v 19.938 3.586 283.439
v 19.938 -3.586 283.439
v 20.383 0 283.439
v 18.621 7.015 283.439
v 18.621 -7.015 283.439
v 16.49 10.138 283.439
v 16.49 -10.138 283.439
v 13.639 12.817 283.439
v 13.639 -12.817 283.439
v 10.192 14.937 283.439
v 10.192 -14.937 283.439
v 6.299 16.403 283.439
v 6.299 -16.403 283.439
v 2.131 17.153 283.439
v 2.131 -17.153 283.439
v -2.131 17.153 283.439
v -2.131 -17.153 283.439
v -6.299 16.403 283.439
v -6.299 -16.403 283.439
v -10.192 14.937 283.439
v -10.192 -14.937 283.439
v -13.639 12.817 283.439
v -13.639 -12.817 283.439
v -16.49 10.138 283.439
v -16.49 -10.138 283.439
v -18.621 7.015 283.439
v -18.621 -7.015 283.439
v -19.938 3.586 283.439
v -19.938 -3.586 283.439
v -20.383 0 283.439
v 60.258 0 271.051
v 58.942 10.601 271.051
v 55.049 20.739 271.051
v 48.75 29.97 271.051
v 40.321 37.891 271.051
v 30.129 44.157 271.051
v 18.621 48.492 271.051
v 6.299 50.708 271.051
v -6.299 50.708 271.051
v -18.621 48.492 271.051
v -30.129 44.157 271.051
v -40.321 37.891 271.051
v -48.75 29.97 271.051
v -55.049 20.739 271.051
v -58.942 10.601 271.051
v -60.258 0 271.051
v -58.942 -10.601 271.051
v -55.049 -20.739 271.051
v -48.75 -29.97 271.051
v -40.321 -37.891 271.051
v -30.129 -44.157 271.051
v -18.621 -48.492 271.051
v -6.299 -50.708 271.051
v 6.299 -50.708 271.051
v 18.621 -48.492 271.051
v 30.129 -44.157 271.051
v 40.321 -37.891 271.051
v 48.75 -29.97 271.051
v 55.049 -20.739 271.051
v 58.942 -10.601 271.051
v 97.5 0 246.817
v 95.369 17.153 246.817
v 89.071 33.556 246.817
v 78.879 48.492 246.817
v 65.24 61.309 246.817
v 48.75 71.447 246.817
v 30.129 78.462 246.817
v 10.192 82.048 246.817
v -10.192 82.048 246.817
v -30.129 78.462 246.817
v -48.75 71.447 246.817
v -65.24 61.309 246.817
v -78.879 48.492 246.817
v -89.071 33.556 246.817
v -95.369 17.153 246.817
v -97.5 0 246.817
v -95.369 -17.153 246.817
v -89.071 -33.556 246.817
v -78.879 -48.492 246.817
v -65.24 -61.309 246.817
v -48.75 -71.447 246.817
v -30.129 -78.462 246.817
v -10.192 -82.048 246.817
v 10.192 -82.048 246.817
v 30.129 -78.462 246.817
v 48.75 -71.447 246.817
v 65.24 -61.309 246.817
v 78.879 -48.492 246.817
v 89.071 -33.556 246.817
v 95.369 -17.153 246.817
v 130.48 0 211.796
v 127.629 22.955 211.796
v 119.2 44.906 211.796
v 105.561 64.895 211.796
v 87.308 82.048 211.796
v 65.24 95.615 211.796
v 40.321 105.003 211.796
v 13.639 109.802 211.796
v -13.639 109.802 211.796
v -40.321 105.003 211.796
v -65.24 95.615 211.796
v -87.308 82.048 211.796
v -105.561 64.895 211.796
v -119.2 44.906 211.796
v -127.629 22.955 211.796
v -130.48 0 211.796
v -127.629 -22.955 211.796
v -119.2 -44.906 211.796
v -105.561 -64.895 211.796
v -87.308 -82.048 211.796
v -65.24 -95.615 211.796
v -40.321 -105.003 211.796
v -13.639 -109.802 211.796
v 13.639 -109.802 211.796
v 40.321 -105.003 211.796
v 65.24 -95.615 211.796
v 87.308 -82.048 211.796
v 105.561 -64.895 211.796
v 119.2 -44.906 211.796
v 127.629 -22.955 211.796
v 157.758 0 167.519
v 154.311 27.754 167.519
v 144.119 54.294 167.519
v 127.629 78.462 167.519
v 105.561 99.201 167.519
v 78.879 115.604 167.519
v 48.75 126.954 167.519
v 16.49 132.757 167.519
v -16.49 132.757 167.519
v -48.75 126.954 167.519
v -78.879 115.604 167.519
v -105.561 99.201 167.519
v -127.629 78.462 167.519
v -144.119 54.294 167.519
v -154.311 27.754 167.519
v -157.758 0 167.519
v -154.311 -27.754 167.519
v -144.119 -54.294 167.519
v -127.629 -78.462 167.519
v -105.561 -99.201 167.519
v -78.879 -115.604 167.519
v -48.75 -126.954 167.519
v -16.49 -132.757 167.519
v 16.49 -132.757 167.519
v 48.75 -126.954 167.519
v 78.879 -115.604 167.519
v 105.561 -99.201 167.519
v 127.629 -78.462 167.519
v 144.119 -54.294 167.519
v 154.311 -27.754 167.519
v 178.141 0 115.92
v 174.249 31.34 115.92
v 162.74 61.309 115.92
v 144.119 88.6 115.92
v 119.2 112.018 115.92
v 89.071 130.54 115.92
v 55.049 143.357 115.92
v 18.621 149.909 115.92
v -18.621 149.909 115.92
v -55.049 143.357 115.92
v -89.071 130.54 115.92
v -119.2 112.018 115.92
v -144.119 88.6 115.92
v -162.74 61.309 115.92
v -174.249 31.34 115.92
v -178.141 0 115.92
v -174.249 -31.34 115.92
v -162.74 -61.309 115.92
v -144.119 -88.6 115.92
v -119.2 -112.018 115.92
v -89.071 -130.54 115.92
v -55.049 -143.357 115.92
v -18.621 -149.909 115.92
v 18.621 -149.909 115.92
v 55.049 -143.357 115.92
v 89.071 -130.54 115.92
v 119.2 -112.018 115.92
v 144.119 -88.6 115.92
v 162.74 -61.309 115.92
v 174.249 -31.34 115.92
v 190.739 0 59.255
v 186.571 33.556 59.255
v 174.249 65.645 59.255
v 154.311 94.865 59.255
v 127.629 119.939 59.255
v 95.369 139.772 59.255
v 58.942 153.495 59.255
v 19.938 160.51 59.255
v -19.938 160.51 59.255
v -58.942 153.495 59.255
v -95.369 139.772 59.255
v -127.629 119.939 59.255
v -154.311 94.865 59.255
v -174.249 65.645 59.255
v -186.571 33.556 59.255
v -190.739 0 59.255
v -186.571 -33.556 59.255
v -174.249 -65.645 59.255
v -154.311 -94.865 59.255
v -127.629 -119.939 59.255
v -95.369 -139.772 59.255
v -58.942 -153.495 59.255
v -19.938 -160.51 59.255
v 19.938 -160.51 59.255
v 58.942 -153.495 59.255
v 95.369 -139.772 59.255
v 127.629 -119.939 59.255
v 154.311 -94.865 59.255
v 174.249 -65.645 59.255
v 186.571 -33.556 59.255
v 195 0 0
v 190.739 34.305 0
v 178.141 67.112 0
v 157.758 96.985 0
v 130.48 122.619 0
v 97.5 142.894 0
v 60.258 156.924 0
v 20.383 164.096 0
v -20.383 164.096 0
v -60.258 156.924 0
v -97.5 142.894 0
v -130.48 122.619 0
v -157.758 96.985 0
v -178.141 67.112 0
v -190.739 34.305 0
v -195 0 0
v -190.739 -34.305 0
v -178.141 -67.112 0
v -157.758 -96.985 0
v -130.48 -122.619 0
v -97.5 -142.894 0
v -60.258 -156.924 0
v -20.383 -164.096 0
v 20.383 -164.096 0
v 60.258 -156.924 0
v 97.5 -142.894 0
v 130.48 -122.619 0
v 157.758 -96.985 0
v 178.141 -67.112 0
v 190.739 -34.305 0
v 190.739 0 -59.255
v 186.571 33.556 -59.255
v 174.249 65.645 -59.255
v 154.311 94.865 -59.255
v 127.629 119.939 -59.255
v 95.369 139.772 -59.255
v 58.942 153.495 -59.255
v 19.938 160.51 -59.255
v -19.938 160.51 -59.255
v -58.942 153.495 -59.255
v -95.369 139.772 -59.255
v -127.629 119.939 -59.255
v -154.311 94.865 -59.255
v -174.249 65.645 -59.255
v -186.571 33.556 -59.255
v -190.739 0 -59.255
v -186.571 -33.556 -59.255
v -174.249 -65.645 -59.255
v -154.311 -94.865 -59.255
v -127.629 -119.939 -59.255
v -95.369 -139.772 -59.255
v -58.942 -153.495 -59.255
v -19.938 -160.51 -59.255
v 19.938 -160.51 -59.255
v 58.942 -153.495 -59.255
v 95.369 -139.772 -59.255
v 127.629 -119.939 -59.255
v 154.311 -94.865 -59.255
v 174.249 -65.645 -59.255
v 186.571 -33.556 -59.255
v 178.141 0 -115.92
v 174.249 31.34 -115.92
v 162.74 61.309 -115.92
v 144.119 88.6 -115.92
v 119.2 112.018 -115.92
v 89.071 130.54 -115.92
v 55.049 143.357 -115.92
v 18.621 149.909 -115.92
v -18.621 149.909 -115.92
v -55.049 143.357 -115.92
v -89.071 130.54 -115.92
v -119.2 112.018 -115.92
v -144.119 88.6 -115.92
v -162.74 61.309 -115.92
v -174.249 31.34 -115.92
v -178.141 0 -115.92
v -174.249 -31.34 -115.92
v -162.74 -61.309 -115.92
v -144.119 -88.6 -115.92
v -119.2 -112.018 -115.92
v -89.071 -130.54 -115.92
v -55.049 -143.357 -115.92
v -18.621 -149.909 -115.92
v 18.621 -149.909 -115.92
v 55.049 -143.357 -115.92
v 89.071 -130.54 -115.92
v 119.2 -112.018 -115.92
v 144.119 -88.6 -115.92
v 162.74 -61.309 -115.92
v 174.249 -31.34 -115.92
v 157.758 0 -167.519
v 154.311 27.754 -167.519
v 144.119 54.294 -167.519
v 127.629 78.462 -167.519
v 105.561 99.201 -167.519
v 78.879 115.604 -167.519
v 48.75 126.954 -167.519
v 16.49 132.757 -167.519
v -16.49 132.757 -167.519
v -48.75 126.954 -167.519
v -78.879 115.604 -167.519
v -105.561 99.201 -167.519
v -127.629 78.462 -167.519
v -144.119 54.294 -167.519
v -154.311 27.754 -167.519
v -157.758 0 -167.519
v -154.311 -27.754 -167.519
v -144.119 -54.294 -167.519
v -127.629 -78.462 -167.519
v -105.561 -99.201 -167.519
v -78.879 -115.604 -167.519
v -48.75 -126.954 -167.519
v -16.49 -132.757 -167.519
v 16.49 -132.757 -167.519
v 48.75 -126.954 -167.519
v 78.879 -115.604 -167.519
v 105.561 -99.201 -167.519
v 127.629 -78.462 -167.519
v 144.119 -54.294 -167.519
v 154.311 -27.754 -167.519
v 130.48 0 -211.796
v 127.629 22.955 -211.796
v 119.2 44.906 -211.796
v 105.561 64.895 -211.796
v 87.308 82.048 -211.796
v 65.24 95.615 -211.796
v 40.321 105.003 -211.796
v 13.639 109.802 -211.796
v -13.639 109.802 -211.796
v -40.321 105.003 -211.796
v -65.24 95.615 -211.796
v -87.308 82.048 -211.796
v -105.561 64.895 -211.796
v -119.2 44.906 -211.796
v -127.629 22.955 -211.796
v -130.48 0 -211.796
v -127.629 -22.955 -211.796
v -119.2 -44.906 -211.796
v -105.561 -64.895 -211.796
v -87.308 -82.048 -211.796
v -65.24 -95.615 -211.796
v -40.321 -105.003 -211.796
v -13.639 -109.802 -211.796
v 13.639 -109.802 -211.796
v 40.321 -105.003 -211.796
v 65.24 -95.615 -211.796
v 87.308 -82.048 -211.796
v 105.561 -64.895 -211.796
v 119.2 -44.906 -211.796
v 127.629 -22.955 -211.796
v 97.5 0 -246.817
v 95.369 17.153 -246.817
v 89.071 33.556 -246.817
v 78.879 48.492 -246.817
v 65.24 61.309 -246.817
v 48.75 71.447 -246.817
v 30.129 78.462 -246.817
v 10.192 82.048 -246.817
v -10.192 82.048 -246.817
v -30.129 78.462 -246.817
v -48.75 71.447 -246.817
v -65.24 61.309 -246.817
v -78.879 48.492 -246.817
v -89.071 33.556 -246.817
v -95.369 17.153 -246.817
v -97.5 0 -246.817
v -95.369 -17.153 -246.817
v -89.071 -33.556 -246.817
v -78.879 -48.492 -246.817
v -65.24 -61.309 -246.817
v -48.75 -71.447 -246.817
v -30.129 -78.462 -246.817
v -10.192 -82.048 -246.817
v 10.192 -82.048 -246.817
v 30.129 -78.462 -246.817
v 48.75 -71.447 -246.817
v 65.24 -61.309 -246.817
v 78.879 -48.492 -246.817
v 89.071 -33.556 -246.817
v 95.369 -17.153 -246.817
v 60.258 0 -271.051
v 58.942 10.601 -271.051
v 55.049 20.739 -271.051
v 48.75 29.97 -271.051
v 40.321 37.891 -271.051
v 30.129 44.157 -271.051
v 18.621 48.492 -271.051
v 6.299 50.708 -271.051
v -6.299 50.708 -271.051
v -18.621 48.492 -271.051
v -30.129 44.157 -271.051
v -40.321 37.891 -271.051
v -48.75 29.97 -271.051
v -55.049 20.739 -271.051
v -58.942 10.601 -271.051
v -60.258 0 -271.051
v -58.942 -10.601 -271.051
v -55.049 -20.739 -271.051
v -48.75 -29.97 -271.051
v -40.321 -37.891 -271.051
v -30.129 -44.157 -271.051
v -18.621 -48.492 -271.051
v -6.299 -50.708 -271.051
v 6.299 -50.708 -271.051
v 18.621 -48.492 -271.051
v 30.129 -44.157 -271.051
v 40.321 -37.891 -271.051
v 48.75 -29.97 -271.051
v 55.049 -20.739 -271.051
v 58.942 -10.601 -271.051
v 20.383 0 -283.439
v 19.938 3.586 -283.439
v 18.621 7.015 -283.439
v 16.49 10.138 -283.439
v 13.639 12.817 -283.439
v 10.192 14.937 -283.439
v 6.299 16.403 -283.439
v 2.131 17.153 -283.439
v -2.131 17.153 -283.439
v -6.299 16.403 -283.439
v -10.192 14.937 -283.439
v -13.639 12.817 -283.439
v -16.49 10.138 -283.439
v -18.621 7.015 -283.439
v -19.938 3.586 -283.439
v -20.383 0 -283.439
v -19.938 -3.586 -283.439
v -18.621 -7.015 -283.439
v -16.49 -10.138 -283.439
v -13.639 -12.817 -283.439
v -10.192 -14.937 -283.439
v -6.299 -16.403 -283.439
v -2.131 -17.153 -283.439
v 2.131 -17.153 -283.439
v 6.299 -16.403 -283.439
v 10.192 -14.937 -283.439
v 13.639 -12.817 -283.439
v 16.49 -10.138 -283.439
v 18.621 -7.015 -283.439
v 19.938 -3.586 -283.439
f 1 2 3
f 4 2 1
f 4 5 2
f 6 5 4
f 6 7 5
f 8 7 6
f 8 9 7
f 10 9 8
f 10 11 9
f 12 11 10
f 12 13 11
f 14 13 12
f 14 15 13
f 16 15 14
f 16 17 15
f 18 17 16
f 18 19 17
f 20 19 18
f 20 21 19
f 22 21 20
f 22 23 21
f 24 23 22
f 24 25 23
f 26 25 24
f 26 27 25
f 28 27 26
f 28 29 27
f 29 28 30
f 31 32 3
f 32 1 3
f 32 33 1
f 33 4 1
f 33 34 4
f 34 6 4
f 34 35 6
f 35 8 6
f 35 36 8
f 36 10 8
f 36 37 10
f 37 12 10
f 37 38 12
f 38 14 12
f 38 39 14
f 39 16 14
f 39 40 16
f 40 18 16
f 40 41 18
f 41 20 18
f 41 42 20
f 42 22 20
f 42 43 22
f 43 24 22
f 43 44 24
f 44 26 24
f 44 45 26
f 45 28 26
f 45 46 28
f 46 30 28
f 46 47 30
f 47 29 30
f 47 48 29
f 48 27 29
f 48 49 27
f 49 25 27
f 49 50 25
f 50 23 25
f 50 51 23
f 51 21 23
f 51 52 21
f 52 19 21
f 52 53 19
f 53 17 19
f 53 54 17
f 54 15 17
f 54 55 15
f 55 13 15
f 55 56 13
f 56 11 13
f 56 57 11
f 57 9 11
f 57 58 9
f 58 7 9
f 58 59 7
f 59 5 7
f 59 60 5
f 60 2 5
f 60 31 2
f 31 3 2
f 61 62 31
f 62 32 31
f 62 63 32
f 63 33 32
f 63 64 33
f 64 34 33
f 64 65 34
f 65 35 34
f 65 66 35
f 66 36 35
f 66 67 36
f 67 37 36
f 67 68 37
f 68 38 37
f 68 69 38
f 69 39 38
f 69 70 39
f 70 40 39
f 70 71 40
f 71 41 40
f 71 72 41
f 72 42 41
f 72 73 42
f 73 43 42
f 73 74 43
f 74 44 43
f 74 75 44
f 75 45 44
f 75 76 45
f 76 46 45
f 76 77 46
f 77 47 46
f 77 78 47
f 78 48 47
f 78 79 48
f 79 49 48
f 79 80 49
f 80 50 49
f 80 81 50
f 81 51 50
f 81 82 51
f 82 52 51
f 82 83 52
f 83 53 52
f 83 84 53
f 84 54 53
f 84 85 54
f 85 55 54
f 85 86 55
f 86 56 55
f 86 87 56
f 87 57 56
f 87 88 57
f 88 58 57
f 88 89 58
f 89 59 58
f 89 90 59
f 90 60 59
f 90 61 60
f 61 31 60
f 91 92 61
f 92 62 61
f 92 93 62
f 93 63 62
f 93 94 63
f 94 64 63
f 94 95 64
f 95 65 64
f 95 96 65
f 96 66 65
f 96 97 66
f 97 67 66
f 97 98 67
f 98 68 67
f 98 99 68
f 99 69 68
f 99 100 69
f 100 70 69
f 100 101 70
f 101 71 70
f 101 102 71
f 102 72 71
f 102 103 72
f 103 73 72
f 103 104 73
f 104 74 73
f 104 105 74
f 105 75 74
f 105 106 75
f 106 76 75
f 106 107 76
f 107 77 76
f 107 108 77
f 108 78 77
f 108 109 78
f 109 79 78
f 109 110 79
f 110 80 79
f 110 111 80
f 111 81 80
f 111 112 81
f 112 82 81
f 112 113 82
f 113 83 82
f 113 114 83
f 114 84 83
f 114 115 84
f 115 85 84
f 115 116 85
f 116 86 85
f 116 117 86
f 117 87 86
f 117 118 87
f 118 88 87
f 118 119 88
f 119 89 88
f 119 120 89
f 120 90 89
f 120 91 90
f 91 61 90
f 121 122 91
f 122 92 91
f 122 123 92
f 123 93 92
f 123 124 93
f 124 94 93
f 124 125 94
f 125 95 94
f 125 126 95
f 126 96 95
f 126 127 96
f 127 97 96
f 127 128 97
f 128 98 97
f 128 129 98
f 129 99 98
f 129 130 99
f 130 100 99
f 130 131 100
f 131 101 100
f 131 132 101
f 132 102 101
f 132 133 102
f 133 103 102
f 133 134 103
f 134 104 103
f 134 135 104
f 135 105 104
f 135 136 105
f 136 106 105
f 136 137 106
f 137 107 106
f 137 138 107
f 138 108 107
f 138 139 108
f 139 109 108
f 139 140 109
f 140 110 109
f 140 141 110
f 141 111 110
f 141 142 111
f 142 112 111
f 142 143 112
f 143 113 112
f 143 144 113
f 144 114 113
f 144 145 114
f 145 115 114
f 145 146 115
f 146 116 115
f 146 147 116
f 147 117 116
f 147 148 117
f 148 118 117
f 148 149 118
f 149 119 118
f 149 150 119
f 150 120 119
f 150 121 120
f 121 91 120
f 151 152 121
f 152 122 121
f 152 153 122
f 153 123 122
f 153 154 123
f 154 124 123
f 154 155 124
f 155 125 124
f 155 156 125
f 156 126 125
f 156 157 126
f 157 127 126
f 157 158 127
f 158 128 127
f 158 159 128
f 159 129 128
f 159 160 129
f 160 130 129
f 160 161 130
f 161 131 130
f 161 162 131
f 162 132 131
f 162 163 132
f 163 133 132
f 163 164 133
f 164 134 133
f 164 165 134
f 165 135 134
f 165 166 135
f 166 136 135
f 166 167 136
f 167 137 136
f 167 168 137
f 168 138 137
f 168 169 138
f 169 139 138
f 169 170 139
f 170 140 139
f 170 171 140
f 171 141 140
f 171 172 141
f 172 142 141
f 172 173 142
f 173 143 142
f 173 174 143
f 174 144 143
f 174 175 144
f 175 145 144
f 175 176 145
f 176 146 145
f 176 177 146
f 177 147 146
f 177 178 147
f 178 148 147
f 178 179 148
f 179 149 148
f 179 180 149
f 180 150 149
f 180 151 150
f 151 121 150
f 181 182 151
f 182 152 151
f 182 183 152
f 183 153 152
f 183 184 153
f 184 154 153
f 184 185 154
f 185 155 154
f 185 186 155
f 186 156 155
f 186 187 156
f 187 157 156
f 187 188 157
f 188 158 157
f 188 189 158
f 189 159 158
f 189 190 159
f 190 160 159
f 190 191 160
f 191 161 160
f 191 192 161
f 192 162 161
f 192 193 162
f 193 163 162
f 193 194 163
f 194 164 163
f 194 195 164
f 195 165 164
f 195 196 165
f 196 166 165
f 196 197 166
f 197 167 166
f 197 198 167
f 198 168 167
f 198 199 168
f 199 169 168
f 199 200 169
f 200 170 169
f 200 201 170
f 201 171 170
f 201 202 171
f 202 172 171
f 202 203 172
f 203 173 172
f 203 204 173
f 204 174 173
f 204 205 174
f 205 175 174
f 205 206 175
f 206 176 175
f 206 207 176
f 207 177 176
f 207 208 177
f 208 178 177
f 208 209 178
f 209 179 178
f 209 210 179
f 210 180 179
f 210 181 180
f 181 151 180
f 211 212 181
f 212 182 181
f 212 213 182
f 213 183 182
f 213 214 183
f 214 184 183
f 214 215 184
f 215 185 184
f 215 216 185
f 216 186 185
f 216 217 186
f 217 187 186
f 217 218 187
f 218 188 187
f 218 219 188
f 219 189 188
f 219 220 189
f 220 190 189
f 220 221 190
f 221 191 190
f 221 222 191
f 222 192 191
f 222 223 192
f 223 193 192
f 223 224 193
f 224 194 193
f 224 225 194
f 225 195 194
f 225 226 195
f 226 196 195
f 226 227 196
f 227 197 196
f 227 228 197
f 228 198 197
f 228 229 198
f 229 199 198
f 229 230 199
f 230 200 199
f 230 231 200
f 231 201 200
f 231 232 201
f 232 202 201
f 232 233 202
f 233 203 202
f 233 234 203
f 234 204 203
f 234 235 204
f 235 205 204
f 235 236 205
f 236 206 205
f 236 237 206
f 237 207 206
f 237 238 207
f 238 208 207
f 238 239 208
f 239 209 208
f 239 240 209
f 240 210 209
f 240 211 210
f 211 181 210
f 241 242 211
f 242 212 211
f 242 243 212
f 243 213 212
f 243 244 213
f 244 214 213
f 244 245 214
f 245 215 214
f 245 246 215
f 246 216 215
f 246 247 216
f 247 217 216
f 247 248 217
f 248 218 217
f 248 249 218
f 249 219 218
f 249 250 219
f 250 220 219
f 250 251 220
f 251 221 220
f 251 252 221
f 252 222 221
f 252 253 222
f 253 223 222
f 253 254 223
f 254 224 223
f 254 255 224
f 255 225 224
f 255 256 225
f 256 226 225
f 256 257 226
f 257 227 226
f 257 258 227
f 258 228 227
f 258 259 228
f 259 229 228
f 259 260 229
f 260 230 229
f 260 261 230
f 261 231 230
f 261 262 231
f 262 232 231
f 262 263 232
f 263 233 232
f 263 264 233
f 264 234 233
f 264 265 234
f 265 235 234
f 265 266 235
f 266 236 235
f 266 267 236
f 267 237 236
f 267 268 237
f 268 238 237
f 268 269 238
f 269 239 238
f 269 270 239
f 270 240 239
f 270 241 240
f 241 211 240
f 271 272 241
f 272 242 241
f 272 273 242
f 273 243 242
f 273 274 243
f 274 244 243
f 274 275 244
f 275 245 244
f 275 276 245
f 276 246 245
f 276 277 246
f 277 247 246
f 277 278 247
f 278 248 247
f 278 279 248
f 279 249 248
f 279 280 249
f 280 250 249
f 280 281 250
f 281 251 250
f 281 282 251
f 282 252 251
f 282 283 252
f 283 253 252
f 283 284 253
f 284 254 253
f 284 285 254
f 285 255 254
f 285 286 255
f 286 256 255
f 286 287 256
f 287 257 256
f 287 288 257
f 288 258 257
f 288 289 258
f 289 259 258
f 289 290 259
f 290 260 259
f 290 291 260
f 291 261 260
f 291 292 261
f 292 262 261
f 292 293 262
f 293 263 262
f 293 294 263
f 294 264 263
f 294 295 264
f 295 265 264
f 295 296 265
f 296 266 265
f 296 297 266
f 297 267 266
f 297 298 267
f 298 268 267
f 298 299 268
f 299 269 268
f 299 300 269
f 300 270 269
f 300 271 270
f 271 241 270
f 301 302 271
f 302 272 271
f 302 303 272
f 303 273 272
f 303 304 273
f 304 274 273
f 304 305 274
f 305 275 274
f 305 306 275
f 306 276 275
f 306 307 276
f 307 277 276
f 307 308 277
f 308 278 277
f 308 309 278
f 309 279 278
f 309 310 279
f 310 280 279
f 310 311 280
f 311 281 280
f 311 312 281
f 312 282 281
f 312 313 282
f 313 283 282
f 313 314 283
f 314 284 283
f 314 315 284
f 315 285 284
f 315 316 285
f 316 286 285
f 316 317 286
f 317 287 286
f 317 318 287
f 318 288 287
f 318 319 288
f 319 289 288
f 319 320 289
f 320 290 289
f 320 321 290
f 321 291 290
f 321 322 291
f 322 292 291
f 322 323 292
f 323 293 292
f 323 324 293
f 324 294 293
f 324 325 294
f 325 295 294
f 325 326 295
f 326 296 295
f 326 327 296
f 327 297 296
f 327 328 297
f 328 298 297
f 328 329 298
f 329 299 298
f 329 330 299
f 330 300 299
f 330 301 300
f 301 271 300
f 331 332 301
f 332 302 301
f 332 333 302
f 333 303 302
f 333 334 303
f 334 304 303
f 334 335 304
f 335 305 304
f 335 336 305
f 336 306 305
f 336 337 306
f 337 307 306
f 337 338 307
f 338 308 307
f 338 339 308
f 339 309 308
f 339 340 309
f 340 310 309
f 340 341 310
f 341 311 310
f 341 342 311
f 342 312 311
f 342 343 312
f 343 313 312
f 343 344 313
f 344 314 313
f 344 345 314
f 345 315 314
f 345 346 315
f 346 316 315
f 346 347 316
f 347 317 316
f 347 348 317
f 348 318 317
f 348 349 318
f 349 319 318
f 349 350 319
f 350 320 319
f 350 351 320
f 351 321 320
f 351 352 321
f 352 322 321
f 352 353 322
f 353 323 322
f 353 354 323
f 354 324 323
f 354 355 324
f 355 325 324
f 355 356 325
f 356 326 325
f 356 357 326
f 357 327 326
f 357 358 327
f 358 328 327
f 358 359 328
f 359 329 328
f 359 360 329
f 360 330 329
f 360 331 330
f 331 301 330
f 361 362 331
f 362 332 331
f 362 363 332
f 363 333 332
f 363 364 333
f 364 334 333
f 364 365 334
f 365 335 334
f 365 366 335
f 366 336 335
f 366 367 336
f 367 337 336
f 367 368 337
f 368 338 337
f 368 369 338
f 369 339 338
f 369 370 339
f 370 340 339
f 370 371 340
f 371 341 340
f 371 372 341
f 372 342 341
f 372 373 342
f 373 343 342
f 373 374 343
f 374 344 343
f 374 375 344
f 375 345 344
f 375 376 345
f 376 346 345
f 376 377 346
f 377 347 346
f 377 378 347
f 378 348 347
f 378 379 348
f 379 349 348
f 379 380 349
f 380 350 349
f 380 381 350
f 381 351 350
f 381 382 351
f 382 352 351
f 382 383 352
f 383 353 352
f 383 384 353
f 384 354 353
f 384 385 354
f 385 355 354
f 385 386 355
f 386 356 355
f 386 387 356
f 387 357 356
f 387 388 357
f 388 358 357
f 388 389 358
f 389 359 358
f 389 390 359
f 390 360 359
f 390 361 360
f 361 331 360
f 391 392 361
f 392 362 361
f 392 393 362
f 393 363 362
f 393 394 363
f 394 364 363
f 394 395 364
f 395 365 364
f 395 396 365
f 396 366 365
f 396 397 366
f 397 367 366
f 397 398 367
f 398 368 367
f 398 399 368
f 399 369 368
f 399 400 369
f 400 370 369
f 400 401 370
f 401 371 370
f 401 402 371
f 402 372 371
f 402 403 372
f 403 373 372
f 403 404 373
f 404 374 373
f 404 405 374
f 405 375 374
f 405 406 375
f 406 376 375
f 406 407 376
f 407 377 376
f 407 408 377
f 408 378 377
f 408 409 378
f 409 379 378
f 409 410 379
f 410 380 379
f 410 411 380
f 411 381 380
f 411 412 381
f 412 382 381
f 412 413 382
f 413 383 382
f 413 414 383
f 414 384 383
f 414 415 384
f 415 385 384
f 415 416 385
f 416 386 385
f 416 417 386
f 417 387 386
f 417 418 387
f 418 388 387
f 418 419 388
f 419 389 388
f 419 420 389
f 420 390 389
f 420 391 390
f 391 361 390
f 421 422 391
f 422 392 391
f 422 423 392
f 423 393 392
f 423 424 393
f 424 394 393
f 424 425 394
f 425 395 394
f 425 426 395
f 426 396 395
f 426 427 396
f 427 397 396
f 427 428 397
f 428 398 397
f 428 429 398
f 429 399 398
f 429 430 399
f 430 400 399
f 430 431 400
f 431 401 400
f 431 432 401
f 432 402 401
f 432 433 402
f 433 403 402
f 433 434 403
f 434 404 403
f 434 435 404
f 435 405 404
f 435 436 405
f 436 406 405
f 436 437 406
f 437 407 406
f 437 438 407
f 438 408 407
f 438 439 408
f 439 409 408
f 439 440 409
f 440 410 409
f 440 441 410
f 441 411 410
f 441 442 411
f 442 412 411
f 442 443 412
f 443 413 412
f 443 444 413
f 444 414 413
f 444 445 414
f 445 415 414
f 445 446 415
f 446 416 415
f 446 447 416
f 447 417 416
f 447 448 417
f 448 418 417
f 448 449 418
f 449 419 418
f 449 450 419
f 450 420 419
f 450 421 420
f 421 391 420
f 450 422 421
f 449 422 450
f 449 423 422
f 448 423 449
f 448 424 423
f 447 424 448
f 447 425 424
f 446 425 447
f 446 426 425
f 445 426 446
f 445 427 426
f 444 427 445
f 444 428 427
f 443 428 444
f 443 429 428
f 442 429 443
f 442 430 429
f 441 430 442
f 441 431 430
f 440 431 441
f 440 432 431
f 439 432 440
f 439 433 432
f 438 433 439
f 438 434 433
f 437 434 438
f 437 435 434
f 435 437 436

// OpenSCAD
// Generated by SolidPython 1.0.1 on 2020-07-29 00:46:51


scale(v = [13, 11, 19]) {
	sphere(r = 15);
}
/***********************************************
*********      SolidPython code:      **********
************************************************
 
# import packages: SolidPython
from solid import *
from solid.utils import *
from itertools import chain, combinations, permutations


class Resize:

    def __init__(self, scad_file):
        self.scad_file = scad_file
        #self.scad_file = import_scad(scad_file)
        # cone/cylinder param:
        self.r1 = 0
        self.r2 = 0
        self.h = 0
        # rectangular prism param:
        self.w = 0
        self.l = 0
        # ellipse param:
        self.r = 0

    # import OpenScad code (file name corresponds to shape)


    # classify shape + parameters
    def assign(self, param1, param2, param3):
        if self.scad_file == 'cone.scad':
            self.r1 = param1
            self.r2 = param2
            self.h = param3
        elif self.scad_file == 'cylinder.scad':
            self.r1 = param1
            self.r2 = param2
            self.h = param3
        elif self.scad_file == 'rectangularPrism.scad':
            self.h = param1
            self.l = param2
            self.w = param3
        else:
            self.r = param1
            self.h = param2

    # resize parameters
    def iterate(self):
        x = range(3, 20, 2)
        i = 1
        if self.scad_file == 'cone.scad':
            tempList = list(permutations(x, 2))
            for temp in tempList:
                param1 = temp[0]
                param2 = temp[1]
                filepath = 'produced_scad_files/' + 'cone' + str(param1) + '_' + str(param2) + '_' + '.scad'
                scad_render_to_file(cylinder(h=param1, r1=param2, r2=0), filepath)

        elif self.scad_file == 'cylinder.scad':
            tempList = list(permutations(x, 3))
            for temp in tempList:
                param1 = temp[0]
                param2 = temp[1]
                filepath = 'produced_scad_files/' + 'cylinder' + str(param1) + '_' + str(param2) + '_' + '.scad'
                scad_render_to_file(cylinder(h=param1, r1=param2, r2=param2), filepath)

        elif self.scad_file == 'rectangularPrism.scad':
            tempList = list(permutations(x, 3))
            for temp in tempList:
                param1 = temp[0]
                param2 = temp[1]
                param3 = temp[2]
                filepath = 'produced_scad_files/' + 'rectangularPrism' + str(param1) + '_' + str(param2) + '_' + str(
                    param3) + '.scad'
                scad_render_to_file(cube(size=(param1, param2, param3)), filepath)

        elif self.scad_file == 'ellipse.scad':
            tempList = list(permutations(x, 4))
            for temp in tempList:
                param1 = temp[0]
                param2 = temp[1]
                param3 = temp[2]
                param4 = temp[3]
                filepath = 'produced_scad_files/' + 'ellipse' + str(param1) + '_' + str(param2) + '_' + str(param3) + '_' + str(param4) + '.scad'
                scad_render_to_file(scale([param1, param2, param3])(sphere(r=param4)), filepath)

    def render_to_scadfile(self):
        scad_render_to_file(scad, 'example.scad') 
 
************************************************/
